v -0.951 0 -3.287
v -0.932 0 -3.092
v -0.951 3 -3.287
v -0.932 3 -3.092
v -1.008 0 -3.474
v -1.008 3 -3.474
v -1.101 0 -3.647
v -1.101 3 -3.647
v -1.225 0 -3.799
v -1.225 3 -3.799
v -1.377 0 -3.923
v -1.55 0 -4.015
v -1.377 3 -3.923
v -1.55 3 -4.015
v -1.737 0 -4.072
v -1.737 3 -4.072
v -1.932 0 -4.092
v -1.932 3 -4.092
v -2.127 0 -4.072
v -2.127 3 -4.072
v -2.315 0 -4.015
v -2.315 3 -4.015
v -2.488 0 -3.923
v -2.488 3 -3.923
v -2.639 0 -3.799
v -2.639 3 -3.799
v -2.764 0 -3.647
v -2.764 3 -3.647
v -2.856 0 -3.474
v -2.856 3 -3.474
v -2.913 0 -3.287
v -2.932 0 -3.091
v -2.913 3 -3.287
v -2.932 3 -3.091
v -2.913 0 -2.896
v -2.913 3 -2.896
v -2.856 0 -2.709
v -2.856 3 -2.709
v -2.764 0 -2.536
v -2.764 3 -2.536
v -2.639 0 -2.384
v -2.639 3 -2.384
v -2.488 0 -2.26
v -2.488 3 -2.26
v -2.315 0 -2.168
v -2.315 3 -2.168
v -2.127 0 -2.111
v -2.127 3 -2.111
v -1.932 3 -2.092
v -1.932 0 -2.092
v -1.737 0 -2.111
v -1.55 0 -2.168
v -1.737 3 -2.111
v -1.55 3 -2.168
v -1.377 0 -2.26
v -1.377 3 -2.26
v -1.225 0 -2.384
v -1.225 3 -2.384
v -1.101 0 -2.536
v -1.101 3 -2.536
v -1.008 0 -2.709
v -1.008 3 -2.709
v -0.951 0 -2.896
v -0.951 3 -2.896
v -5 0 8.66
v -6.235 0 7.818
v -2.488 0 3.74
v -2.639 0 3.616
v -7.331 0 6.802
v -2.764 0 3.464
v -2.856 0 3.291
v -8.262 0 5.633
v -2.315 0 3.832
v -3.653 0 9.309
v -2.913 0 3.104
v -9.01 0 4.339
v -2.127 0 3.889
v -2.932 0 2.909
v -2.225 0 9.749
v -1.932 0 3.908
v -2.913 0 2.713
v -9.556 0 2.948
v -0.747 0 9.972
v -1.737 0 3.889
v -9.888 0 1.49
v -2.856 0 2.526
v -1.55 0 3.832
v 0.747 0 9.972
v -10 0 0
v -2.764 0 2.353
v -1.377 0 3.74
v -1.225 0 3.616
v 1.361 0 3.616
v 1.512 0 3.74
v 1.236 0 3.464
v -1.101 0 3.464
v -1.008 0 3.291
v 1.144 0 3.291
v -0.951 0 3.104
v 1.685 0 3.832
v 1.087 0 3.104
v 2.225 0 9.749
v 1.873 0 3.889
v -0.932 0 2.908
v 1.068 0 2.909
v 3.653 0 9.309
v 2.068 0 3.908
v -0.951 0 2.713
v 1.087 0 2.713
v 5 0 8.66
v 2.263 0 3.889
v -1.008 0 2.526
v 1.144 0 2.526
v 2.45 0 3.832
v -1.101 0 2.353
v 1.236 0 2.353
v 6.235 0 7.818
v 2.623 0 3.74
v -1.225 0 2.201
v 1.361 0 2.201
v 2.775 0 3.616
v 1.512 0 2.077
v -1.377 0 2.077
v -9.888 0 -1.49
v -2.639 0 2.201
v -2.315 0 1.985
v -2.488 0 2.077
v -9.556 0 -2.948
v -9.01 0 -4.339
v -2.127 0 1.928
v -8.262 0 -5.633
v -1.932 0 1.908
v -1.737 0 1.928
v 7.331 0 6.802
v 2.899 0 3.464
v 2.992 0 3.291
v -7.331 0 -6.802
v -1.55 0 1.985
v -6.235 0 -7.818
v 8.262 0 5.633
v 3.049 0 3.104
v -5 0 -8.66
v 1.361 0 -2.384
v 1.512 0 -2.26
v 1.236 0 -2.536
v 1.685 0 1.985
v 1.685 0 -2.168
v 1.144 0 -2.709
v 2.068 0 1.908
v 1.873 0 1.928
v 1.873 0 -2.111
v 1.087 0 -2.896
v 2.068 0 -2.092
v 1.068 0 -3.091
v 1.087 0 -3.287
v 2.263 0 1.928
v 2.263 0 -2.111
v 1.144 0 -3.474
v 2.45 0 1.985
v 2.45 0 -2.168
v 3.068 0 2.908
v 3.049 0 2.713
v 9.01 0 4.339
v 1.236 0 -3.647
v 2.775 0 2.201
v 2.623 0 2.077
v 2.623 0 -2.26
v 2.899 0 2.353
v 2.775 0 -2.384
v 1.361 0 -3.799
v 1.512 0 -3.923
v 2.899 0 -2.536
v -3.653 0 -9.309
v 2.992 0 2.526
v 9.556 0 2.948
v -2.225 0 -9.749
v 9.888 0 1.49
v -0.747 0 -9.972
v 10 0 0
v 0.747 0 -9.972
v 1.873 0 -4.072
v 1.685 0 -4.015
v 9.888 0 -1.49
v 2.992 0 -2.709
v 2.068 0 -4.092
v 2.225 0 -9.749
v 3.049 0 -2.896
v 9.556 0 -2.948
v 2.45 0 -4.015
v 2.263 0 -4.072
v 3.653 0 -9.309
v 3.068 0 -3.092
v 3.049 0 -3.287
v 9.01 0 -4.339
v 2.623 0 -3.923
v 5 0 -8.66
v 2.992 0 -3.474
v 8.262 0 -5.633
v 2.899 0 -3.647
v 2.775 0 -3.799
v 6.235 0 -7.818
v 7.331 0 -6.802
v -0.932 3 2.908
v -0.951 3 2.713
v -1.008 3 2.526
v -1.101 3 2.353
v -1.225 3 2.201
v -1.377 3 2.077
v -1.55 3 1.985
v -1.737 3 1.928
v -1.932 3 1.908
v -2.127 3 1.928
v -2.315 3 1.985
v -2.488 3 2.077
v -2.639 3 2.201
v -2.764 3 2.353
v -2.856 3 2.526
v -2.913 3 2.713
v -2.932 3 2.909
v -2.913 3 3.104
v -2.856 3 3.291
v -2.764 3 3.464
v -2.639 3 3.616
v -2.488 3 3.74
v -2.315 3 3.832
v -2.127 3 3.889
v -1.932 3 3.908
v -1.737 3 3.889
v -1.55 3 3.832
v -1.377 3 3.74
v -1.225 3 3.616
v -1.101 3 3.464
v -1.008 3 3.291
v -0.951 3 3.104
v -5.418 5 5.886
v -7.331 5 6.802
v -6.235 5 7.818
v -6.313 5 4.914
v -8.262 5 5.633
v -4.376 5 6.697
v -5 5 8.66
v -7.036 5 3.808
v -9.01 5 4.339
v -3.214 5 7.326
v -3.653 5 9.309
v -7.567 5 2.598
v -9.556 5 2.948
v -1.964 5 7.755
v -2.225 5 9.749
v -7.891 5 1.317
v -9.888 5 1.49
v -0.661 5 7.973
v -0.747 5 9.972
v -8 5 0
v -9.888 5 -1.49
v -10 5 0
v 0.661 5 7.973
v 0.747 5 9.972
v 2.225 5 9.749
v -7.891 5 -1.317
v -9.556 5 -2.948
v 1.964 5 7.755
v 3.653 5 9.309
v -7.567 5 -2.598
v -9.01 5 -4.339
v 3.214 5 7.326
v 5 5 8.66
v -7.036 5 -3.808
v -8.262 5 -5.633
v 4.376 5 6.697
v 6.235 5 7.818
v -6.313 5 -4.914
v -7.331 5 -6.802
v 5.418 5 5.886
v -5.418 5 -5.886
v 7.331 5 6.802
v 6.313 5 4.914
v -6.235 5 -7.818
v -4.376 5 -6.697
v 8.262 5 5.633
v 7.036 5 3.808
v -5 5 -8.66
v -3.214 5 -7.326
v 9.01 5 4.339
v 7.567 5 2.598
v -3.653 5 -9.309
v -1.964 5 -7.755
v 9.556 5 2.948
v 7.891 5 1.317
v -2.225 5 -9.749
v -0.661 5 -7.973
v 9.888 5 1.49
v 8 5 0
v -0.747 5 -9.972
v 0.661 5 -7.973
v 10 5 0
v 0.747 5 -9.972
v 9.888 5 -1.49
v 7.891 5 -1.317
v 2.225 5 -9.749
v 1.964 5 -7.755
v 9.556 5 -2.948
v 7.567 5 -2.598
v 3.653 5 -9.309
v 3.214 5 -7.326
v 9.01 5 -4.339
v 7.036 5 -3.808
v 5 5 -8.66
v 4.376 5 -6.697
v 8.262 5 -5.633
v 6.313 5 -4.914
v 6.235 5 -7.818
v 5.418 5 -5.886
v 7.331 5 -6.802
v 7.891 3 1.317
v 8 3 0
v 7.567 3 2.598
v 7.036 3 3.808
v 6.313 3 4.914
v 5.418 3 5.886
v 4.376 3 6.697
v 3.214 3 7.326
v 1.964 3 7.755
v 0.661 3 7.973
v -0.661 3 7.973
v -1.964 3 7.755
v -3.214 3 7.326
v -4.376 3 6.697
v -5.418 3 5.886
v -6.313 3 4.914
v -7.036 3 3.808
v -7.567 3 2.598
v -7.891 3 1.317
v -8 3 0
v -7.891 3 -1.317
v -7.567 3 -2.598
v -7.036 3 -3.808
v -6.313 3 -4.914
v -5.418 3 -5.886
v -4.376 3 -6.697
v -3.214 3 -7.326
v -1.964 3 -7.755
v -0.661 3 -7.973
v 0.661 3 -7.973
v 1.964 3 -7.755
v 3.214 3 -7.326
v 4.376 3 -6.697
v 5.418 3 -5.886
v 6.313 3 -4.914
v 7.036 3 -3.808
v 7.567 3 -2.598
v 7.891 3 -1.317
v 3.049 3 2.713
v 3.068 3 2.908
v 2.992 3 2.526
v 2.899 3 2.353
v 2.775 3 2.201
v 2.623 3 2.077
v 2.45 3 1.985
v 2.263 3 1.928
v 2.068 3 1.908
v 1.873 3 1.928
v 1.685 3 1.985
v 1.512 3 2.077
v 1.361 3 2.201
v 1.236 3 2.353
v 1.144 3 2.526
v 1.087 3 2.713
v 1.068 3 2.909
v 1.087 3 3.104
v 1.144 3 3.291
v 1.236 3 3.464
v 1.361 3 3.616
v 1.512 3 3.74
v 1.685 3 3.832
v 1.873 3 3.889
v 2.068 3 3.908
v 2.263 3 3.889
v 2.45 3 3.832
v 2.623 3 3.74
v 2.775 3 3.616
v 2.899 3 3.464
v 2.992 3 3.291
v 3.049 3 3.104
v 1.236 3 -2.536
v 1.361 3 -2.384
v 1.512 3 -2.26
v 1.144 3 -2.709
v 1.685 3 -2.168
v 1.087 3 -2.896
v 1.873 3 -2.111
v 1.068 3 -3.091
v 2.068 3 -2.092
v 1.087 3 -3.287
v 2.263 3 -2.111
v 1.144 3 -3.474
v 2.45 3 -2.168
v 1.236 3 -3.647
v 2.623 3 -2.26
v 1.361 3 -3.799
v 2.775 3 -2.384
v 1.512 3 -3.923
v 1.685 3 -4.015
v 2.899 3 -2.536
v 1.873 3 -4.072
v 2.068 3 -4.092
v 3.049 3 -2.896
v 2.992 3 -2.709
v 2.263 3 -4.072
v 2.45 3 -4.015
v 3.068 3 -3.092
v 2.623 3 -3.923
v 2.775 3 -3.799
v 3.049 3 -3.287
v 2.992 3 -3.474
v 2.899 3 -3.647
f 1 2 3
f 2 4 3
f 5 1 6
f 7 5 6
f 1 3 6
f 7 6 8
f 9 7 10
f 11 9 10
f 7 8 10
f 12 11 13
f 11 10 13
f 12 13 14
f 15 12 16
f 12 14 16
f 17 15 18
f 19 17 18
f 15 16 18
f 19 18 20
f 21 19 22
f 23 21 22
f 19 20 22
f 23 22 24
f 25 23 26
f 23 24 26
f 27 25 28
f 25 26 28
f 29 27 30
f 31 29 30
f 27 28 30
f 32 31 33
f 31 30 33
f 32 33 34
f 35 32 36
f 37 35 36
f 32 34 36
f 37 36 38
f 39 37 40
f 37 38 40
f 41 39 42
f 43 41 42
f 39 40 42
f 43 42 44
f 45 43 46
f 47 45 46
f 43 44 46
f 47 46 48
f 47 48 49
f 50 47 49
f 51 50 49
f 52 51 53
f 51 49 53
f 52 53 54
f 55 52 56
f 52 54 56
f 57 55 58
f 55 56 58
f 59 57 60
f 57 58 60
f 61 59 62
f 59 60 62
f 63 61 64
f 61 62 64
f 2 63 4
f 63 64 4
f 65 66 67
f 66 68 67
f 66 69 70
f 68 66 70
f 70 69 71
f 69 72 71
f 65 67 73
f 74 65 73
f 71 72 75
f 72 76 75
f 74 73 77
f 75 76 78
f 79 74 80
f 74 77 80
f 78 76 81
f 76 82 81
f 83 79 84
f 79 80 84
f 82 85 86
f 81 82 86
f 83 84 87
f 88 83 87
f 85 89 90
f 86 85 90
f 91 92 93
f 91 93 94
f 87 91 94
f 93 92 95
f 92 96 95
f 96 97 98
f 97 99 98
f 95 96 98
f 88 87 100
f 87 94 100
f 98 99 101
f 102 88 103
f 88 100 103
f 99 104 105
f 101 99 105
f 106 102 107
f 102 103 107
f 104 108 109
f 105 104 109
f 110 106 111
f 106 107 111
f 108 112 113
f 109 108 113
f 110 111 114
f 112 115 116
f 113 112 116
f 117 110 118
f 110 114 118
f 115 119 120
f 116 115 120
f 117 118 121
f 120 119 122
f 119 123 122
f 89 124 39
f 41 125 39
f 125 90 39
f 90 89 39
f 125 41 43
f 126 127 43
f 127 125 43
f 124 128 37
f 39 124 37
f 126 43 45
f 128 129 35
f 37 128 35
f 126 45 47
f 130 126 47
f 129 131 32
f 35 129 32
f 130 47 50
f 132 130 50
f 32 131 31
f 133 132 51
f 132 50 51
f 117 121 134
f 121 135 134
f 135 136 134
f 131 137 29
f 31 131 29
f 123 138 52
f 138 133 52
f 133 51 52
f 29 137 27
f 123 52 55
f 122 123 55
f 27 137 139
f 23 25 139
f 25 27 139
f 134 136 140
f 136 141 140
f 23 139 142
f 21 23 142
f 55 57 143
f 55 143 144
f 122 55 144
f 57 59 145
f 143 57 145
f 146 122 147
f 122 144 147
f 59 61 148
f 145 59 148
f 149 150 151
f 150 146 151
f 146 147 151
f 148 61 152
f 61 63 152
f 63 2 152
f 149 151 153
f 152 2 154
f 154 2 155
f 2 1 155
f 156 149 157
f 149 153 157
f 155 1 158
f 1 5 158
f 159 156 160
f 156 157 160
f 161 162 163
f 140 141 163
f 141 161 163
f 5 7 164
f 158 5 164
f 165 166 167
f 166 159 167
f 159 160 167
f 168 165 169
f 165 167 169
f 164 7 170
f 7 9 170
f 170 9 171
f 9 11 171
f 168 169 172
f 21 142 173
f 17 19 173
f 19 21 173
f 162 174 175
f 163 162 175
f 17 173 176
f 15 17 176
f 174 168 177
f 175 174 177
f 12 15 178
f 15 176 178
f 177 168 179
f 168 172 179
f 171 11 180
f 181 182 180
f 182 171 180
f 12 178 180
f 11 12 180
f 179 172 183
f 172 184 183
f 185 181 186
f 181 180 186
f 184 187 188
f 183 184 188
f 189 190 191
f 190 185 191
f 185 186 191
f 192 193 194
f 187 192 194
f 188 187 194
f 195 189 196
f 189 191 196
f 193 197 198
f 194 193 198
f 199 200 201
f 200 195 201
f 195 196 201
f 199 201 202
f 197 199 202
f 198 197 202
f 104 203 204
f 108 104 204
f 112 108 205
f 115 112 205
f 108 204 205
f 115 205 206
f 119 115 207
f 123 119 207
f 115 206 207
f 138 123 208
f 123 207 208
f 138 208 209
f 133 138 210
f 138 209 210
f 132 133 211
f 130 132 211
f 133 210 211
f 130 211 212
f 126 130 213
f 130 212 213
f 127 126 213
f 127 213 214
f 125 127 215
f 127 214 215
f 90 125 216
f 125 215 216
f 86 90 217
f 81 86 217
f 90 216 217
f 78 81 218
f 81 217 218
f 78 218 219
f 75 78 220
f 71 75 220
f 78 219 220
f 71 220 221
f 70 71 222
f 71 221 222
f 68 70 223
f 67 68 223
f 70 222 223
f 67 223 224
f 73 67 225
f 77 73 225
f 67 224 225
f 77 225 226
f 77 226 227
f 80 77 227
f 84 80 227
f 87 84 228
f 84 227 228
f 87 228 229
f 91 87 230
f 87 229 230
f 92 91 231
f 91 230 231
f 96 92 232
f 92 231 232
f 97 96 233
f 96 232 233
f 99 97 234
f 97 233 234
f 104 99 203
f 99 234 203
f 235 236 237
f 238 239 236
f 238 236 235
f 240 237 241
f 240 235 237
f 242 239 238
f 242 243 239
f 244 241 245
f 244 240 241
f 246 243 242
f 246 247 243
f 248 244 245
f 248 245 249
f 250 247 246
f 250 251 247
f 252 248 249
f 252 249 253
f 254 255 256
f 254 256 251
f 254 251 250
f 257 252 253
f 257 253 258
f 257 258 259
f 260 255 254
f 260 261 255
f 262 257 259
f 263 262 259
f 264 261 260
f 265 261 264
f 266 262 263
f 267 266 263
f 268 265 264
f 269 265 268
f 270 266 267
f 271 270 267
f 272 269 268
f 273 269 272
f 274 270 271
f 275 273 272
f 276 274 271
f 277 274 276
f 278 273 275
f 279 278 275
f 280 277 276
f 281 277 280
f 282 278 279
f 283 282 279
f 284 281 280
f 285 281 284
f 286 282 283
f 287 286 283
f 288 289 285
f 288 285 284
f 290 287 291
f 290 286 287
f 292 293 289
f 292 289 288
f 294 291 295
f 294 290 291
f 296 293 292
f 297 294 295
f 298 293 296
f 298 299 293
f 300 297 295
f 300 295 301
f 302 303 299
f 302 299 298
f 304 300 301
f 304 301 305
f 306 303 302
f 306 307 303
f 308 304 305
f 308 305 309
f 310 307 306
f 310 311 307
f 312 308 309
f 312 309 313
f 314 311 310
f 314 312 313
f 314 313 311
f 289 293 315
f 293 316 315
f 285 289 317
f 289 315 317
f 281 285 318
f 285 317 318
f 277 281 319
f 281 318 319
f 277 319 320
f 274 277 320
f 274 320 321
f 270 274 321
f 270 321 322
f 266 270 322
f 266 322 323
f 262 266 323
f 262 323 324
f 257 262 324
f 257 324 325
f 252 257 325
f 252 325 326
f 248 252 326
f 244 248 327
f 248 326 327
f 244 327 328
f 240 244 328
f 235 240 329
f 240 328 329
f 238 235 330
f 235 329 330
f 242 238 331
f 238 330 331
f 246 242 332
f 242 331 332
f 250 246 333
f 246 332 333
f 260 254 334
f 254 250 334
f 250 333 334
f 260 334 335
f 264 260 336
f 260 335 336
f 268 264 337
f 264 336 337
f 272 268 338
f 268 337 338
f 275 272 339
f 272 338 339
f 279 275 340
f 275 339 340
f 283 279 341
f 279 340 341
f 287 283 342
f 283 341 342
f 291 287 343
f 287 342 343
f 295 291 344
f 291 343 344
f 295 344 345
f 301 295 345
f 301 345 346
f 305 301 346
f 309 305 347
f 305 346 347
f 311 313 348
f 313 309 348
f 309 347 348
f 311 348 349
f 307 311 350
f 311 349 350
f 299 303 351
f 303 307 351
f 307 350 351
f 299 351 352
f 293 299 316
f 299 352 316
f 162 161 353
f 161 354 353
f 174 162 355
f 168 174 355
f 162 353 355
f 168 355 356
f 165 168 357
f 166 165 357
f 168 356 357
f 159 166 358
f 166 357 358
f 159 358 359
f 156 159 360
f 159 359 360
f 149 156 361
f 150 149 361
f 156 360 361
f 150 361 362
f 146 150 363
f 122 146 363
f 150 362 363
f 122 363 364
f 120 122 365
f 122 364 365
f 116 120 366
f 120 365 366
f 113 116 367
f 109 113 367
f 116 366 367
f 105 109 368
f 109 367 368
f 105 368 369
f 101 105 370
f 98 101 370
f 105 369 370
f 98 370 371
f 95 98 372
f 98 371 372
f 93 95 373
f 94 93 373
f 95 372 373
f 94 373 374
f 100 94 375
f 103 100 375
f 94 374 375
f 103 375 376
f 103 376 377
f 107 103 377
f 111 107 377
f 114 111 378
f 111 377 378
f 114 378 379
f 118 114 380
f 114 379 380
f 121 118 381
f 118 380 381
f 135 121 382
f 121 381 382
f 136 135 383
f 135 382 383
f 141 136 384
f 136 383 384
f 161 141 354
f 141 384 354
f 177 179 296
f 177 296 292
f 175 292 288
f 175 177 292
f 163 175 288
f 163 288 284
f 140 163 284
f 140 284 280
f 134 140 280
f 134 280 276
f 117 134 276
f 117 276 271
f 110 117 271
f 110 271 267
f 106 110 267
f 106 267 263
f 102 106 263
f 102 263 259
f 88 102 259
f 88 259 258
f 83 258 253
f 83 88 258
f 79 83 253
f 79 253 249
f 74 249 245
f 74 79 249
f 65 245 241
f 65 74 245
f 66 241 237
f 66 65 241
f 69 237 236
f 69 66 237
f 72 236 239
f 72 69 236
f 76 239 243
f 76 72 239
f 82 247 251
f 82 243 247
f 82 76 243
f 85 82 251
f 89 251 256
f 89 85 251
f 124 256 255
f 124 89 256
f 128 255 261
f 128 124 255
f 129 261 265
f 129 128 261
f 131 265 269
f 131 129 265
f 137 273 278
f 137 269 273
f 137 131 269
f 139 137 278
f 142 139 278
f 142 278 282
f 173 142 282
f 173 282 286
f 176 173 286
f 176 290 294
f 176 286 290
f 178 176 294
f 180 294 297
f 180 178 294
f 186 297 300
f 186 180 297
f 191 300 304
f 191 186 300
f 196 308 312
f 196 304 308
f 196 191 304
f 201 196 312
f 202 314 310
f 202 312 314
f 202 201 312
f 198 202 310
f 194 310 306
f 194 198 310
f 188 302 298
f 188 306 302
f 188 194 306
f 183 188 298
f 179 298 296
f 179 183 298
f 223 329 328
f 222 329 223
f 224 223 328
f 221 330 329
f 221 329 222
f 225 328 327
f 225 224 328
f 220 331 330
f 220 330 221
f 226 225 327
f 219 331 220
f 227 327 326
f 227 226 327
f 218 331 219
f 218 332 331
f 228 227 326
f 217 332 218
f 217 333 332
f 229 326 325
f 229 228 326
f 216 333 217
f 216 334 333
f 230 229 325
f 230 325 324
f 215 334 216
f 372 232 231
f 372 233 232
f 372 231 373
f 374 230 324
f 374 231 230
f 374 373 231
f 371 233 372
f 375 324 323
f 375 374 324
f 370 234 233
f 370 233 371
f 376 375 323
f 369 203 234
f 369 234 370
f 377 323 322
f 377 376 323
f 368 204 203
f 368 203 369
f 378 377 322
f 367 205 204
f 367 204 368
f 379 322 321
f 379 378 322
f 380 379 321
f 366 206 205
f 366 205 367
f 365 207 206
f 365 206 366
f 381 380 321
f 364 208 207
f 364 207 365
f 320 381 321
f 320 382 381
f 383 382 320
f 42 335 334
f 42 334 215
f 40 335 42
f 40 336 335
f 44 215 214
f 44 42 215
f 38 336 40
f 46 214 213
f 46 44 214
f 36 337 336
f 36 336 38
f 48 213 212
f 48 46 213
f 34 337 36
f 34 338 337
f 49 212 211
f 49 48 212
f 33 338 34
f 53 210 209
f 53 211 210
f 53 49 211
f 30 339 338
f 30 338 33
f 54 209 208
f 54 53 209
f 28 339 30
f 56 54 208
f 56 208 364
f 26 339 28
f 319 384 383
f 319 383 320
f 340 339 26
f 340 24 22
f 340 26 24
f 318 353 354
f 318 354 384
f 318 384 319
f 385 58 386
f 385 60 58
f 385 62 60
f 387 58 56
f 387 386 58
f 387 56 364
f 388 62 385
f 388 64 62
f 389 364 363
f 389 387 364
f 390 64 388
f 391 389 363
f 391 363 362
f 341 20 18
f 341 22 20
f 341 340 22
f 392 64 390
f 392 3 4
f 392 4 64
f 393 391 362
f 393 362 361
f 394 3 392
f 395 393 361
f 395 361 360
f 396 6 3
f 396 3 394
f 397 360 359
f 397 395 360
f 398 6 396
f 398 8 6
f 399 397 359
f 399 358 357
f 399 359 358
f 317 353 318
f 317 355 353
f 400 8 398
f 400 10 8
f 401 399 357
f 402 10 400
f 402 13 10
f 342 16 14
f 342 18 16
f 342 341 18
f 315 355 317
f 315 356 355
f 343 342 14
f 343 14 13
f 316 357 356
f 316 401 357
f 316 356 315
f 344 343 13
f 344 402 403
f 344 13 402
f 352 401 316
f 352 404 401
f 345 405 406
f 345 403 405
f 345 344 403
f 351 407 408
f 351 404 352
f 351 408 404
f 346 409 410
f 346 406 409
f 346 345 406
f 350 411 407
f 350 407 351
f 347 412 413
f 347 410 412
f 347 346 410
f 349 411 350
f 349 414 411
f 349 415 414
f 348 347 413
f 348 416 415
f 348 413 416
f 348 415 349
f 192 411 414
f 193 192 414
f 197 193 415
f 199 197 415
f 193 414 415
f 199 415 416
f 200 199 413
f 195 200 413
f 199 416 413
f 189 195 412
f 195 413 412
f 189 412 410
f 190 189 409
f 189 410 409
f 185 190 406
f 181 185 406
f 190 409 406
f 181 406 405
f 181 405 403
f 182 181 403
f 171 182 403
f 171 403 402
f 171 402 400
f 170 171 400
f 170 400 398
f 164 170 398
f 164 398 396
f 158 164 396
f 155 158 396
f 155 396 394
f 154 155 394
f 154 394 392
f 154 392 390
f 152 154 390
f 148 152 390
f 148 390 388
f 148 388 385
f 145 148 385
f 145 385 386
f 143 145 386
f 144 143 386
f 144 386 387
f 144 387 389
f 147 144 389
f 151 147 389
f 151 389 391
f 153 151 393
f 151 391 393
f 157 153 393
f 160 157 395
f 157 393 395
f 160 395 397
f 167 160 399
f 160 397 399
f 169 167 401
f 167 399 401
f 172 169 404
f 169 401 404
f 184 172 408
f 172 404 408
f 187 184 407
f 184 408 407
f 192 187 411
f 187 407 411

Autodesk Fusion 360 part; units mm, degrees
sketch "草图1" plane through (0, 0, 0) normal (0, 1, 0) x (1, 0, 0)
  circle A0 centre (0, 0) radius 10
  circle A1 centre (0, 0) radius 8
  dimension "d1" = 2
extrude "拉伸1" add sketch "草图1" along normal blind 3 contours A1 makes body 1
extrude "拉伸2" add sketch "草图1" along normal blind 5 separate body makes body 2
cylinder "圆柱体基本要素1" add diameter 2 height 20 placed x (1, 0, 0) y (0, 0, -1) z (0, 1, 0) at (20, 0, 1) separate body makes body 3
move_body "对齐1" bodies 3 to x (1, 0, 0) y (0, 1, 0) z (0, 0, 1) at (-20, 0, -1)
pattern_linear "R-阵列1" count 2 spacing 6 along (0, 0, 1) count 2 spacing 4 along (1, 0, 0) of bodies 3 makes body 4 at (0.995, 13.3333, 6.0996) makes body 5 at (4.995, 13.3333, 0.0996) makes body 6 at (4.995, 13.3333, 6.0996)
move_body "移动1" bodies 3 4 5 6 to x (1, 0, 0) y (0, 1, 0) z (0, 0, 1) at (-1.9322, 0, -3.0915)
combine "合并1" operation cut target body 1 tool bodies 3 4 5 6
combine "合并2" operation add target body 2 tool bodies 1
